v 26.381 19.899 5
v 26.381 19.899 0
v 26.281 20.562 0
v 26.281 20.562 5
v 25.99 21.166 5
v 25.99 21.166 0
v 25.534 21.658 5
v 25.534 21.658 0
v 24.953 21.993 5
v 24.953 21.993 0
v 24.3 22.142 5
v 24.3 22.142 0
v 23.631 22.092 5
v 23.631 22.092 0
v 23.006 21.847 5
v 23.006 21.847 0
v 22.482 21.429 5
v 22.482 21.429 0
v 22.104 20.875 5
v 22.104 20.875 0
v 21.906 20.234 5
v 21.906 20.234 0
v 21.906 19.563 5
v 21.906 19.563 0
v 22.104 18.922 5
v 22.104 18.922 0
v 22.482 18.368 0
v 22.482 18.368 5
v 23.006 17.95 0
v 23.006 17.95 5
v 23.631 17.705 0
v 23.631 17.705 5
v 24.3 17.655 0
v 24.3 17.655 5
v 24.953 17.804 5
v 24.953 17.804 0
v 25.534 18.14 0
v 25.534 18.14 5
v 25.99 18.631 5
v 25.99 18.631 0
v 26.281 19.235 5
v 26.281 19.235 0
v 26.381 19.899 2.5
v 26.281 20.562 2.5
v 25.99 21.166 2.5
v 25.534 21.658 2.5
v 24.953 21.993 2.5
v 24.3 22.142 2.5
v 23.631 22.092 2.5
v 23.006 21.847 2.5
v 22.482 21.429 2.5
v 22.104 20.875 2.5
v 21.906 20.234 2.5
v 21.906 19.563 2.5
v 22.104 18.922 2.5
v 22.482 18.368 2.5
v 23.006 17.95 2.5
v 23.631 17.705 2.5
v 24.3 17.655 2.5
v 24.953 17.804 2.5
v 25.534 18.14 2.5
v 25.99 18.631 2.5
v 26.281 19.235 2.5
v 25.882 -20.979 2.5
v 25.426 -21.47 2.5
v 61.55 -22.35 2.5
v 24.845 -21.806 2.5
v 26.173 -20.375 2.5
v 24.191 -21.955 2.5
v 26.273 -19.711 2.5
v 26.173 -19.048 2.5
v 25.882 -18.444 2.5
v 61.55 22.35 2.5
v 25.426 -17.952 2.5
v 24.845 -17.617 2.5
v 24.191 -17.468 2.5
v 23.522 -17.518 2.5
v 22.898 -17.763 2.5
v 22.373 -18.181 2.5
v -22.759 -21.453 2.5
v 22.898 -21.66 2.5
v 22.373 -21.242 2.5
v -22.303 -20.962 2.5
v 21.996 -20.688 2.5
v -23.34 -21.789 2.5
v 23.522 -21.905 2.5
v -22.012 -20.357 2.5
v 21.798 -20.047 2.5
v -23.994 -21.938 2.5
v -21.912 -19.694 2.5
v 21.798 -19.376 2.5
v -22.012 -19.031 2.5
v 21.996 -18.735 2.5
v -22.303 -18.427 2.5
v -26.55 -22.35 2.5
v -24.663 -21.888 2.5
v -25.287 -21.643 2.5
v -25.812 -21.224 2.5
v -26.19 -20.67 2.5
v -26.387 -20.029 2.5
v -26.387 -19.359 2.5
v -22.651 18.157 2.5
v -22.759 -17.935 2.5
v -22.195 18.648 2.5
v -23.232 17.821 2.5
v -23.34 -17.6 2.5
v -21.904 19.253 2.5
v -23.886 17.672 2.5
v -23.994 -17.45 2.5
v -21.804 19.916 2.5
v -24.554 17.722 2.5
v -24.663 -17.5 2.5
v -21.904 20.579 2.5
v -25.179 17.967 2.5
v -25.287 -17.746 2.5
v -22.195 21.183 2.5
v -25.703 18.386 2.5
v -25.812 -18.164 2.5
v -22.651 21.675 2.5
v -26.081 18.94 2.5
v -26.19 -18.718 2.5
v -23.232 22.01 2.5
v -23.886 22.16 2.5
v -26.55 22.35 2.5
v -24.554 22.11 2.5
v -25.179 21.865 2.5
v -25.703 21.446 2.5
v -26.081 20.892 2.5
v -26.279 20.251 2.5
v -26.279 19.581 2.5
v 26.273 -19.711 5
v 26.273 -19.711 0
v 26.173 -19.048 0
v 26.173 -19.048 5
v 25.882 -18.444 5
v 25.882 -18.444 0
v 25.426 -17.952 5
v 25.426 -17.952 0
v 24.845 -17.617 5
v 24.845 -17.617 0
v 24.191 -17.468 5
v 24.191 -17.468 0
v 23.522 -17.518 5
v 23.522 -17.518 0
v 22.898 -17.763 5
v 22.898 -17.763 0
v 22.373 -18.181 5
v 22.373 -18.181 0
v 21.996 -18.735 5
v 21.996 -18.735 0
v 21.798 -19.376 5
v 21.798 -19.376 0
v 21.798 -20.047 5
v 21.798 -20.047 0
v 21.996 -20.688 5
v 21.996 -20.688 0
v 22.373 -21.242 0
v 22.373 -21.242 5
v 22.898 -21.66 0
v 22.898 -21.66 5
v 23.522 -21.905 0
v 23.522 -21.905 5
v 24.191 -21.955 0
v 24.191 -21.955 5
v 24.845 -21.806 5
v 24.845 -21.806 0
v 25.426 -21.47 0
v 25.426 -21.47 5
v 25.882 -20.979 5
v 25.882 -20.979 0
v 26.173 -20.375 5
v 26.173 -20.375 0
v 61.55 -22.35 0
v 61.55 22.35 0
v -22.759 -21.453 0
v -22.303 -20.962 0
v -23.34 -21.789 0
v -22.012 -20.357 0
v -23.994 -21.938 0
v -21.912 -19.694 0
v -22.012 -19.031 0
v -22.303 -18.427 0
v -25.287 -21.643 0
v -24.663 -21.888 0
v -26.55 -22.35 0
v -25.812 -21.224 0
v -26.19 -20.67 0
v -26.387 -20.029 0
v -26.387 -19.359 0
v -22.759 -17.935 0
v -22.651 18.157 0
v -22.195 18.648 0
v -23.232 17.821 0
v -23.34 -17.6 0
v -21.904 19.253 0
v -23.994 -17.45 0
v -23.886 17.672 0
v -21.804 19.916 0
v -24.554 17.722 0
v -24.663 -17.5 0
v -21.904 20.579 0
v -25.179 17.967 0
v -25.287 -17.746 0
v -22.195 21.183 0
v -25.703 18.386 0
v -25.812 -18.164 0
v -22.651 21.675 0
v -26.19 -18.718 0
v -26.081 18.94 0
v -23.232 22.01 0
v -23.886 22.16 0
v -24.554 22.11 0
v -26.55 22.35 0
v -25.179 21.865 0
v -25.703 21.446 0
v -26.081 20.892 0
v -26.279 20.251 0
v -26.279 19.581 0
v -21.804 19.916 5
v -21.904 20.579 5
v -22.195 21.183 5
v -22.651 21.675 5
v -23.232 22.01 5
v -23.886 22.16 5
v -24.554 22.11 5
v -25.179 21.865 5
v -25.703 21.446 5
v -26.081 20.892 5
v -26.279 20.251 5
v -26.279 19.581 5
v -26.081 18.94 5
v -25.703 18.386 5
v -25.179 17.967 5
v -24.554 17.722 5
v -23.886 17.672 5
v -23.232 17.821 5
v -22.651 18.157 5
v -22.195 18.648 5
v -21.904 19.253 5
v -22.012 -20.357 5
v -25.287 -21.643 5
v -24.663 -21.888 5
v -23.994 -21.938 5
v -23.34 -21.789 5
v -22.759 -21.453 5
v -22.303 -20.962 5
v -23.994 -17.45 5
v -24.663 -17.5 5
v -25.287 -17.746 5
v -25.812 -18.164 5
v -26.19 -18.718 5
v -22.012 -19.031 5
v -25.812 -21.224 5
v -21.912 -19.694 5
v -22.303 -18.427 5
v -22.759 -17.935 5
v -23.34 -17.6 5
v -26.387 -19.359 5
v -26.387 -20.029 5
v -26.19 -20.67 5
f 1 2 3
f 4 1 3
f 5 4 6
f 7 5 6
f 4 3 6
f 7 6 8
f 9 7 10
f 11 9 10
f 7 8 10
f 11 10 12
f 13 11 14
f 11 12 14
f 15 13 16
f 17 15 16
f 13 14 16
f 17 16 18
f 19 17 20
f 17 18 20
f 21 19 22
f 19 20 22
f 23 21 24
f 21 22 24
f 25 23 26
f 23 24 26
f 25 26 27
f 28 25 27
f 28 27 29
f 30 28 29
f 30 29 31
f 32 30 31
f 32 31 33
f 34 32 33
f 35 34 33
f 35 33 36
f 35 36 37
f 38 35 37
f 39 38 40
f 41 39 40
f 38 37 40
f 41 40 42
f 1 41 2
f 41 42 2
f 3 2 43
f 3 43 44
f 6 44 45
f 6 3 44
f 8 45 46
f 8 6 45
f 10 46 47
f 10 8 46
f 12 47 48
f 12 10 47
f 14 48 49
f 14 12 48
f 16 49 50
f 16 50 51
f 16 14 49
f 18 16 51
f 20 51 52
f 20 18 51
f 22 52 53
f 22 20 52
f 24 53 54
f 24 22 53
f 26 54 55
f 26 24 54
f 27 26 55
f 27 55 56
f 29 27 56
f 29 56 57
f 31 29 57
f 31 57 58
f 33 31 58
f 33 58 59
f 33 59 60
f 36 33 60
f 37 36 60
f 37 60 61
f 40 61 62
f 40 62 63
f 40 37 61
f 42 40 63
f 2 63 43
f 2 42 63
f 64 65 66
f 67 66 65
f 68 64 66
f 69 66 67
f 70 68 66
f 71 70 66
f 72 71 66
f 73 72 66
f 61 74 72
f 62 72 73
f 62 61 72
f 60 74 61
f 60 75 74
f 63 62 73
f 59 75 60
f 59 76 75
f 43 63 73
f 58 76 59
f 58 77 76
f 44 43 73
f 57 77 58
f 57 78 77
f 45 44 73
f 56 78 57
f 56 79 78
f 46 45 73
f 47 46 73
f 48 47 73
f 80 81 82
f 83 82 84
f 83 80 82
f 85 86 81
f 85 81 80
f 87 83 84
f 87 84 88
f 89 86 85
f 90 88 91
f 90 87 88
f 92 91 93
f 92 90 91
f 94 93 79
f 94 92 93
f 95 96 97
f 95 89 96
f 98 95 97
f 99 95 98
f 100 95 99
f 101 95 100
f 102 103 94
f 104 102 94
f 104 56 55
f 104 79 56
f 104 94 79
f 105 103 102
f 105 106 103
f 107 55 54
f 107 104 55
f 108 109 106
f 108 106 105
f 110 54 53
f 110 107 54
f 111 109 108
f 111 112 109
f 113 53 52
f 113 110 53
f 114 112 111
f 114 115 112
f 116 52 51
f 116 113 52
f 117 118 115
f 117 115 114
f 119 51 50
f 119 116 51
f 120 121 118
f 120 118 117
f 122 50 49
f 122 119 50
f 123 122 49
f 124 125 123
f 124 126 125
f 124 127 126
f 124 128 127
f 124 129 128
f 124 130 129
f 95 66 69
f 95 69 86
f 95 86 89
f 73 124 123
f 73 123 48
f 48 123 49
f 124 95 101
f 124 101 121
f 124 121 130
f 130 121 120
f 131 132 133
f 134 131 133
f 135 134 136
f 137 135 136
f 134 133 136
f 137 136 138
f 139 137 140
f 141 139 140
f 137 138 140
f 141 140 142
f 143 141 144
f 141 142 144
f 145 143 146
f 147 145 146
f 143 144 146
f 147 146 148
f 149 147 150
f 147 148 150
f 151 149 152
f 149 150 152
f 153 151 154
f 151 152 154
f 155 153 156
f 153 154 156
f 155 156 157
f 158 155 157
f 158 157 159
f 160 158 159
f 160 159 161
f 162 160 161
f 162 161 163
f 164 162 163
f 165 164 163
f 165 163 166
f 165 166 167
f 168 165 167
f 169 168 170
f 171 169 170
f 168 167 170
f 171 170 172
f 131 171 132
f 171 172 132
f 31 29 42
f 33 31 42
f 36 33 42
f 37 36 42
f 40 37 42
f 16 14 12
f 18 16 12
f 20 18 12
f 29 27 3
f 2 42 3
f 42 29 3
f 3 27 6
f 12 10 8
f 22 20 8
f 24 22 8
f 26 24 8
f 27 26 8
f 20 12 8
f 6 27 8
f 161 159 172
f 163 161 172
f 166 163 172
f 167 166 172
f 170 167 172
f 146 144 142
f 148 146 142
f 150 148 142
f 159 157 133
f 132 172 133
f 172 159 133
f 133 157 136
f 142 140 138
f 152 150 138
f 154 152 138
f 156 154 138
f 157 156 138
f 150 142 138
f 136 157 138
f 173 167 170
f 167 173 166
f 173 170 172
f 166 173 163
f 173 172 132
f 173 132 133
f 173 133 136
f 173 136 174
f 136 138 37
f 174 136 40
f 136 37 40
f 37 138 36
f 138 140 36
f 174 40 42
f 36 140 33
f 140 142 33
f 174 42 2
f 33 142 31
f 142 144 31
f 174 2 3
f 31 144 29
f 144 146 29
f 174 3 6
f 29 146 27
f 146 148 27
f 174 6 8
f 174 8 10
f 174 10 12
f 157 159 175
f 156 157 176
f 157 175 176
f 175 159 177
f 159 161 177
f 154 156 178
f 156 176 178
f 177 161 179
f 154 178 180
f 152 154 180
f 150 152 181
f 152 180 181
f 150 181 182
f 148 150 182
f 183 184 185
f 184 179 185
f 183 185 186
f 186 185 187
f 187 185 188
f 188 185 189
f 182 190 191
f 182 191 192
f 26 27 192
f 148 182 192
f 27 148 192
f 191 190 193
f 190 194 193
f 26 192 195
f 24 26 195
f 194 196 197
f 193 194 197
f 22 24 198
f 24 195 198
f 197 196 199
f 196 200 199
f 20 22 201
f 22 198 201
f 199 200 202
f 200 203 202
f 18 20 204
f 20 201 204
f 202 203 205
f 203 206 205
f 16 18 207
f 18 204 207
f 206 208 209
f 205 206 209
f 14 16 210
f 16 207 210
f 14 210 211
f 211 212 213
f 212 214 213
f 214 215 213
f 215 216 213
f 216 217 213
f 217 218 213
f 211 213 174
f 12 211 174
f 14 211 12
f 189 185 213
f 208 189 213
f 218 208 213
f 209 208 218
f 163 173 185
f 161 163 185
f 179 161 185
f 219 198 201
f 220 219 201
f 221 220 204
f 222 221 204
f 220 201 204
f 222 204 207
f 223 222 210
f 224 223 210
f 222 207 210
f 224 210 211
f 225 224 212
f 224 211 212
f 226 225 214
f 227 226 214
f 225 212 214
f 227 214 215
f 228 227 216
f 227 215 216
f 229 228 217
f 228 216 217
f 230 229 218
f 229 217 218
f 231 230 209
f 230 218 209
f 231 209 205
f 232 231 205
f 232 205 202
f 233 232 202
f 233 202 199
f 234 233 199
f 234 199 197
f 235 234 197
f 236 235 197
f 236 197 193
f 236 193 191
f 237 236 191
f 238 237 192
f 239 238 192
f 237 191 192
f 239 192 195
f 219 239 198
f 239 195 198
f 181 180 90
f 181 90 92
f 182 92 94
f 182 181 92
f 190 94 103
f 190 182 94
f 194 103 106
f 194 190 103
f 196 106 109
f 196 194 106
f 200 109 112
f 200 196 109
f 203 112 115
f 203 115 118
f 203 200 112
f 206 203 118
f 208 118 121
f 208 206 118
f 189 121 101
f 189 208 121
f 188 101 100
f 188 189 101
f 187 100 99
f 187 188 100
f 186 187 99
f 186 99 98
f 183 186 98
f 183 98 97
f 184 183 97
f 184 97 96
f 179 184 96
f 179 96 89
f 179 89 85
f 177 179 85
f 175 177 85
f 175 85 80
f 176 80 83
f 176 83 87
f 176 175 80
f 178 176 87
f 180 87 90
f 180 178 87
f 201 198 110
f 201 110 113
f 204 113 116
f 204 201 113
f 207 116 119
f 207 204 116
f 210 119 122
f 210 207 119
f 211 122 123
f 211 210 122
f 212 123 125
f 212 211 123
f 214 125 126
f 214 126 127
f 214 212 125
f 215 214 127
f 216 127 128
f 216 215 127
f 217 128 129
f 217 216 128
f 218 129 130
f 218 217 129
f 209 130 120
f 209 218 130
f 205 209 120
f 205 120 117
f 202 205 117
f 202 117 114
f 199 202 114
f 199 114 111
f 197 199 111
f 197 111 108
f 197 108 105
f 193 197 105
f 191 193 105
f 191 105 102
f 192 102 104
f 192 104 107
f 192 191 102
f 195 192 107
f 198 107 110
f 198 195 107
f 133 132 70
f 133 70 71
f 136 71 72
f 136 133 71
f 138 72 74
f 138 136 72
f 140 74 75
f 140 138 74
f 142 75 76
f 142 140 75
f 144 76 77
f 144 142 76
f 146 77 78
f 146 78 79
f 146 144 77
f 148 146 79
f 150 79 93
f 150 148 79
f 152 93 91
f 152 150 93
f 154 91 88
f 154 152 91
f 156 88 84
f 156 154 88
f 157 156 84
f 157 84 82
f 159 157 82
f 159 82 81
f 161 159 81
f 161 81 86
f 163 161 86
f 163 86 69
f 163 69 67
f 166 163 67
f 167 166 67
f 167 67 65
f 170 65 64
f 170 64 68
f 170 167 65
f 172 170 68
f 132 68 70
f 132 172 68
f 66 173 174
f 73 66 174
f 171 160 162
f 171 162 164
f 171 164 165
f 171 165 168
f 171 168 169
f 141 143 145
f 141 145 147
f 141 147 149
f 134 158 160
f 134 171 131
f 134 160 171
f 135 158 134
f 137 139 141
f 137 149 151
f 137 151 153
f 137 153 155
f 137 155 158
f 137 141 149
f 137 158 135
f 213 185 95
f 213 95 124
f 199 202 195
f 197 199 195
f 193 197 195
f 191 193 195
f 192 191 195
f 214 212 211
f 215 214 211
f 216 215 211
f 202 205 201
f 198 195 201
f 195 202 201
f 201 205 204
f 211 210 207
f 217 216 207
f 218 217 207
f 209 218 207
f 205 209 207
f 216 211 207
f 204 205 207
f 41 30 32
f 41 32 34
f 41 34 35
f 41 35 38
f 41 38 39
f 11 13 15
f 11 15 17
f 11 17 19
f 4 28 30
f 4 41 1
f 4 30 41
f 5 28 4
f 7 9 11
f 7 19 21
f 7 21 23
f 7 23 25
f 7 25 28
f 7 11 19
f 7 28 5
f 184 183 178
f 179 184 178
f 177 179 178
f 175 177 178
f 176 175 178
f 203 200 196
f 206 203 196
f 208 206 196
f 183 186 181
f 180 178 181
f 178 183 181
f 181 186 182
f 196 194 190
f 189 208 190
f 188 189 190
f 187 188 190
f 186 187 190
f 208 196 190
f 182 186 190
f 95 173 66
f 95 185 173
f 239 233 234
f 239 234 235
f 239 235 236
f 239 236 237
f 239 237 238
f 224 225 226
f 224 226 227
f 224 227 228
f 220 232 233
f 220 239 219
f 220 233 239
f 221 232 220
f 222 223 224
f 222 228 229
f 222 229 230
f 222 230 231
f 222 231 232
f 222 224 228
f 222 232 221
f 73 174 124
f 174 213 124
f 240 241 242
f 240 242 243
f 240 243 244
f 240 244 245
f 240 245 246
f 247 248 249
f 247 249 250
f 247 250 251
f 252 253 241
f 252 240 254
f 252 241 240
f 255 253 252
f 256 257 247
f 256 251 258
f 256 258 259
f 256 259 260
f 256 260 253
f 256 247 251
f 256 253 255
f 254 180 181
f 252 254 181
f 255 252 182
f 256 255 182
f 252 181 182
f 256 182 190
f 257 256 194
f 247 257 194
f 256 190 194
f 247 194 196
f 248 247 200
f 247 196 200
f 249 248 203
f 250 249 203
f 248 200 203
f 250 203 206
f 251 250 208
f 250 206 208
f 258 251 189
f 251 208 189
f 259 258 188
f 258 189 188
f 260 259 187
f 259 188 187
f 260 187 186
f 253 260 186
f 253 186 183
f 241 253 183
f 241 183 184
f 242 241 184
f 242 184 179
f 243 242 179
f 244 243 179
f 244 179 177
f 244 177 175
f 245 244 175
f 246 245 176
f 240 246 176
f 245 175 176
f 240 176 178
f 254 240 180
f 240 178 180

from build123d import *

# Parameters (mm, degrees)
F0_R     = 2.25
F1_DEPTH = 5
F0_W     = 53.1
F0_H     = 44.7
F2_DEPTH = 2.5
F6_DEPTH = 35


# Not quite as in the source:
# - the program builds the solid bodies; features that only make, move or delete a surface that nothing else refers to are left out


with BuildPart() as f1:
    # F0 (on Top) → F1 (new body)
    with BuildSketch(Plane.XY):
        with Locations((24.1313669831, 19.8986493051)):
            Circle(F0_R)
    extrude(amount=F1_DEPTH)


with BuildPart() as f1b:
    # F0 (on Top) → F1, piece 2 (new body)
    with BuildSketch(Plane.XY):
        with Locations((-24.0537095815, 19.9159570038)):
            Circle(F0_R)
    extrude(amount=F1_DEPTH)


with BuildPart() as f1c:
    # F0 (on Top) → F1, piece 3 (new body)
    with BuildSketch(Plane.XY):
        with Locations((-24.1623297334, -19.694061164)):
            Circle(F0_R)
    extrude(amount=F1_DEPTH)


with BuildPart() as f1d:
    # F0 (on Top) → F1, piece 4 (new body)
    with BuildSketch(Plane.XY):
        with Locations((24.0227468312, -19.7113688628)):
            Circle(F0_R)
    extrude(amount=F1_DEPTH)


with BuildPart() as f2:
    # F0 (on Top) → F2 (new body)
    with BuildSketch(Plane.XY):
        Rectangle(F0_W, F0_H)
        with Locations((-24.1623297334, -19.694061164)):
            Circle(F0_R, mode=Mode.SUBTRACT)
        with Locations((24.0227468312, -19.7113688628)):
            Circle(F0_R, mode=Mode.SUBTRACT)
        with Locations((-24.0537095815, 19.9159570038)):
            Circle(F0_R, mode=Mode.SUBTRACT)
        with Locations((24.1313669831, 19.8986493051)):
            Circle(F0_R, mode=Mode.SUBTRACT)
    extrude(amount=F2_DEPTH)

    # F6 (add): a face of the model
    f6_faces = [f2.faces().sort_by_distance(p)[0] for p in [
        (26.55, 0, 1.25),
    ]]
    extrude(f6_faces, amount=F6_DEPTH)


solid = Compound([f1.part, f1b.part, f1c.part, f1d.part, f2.part])
